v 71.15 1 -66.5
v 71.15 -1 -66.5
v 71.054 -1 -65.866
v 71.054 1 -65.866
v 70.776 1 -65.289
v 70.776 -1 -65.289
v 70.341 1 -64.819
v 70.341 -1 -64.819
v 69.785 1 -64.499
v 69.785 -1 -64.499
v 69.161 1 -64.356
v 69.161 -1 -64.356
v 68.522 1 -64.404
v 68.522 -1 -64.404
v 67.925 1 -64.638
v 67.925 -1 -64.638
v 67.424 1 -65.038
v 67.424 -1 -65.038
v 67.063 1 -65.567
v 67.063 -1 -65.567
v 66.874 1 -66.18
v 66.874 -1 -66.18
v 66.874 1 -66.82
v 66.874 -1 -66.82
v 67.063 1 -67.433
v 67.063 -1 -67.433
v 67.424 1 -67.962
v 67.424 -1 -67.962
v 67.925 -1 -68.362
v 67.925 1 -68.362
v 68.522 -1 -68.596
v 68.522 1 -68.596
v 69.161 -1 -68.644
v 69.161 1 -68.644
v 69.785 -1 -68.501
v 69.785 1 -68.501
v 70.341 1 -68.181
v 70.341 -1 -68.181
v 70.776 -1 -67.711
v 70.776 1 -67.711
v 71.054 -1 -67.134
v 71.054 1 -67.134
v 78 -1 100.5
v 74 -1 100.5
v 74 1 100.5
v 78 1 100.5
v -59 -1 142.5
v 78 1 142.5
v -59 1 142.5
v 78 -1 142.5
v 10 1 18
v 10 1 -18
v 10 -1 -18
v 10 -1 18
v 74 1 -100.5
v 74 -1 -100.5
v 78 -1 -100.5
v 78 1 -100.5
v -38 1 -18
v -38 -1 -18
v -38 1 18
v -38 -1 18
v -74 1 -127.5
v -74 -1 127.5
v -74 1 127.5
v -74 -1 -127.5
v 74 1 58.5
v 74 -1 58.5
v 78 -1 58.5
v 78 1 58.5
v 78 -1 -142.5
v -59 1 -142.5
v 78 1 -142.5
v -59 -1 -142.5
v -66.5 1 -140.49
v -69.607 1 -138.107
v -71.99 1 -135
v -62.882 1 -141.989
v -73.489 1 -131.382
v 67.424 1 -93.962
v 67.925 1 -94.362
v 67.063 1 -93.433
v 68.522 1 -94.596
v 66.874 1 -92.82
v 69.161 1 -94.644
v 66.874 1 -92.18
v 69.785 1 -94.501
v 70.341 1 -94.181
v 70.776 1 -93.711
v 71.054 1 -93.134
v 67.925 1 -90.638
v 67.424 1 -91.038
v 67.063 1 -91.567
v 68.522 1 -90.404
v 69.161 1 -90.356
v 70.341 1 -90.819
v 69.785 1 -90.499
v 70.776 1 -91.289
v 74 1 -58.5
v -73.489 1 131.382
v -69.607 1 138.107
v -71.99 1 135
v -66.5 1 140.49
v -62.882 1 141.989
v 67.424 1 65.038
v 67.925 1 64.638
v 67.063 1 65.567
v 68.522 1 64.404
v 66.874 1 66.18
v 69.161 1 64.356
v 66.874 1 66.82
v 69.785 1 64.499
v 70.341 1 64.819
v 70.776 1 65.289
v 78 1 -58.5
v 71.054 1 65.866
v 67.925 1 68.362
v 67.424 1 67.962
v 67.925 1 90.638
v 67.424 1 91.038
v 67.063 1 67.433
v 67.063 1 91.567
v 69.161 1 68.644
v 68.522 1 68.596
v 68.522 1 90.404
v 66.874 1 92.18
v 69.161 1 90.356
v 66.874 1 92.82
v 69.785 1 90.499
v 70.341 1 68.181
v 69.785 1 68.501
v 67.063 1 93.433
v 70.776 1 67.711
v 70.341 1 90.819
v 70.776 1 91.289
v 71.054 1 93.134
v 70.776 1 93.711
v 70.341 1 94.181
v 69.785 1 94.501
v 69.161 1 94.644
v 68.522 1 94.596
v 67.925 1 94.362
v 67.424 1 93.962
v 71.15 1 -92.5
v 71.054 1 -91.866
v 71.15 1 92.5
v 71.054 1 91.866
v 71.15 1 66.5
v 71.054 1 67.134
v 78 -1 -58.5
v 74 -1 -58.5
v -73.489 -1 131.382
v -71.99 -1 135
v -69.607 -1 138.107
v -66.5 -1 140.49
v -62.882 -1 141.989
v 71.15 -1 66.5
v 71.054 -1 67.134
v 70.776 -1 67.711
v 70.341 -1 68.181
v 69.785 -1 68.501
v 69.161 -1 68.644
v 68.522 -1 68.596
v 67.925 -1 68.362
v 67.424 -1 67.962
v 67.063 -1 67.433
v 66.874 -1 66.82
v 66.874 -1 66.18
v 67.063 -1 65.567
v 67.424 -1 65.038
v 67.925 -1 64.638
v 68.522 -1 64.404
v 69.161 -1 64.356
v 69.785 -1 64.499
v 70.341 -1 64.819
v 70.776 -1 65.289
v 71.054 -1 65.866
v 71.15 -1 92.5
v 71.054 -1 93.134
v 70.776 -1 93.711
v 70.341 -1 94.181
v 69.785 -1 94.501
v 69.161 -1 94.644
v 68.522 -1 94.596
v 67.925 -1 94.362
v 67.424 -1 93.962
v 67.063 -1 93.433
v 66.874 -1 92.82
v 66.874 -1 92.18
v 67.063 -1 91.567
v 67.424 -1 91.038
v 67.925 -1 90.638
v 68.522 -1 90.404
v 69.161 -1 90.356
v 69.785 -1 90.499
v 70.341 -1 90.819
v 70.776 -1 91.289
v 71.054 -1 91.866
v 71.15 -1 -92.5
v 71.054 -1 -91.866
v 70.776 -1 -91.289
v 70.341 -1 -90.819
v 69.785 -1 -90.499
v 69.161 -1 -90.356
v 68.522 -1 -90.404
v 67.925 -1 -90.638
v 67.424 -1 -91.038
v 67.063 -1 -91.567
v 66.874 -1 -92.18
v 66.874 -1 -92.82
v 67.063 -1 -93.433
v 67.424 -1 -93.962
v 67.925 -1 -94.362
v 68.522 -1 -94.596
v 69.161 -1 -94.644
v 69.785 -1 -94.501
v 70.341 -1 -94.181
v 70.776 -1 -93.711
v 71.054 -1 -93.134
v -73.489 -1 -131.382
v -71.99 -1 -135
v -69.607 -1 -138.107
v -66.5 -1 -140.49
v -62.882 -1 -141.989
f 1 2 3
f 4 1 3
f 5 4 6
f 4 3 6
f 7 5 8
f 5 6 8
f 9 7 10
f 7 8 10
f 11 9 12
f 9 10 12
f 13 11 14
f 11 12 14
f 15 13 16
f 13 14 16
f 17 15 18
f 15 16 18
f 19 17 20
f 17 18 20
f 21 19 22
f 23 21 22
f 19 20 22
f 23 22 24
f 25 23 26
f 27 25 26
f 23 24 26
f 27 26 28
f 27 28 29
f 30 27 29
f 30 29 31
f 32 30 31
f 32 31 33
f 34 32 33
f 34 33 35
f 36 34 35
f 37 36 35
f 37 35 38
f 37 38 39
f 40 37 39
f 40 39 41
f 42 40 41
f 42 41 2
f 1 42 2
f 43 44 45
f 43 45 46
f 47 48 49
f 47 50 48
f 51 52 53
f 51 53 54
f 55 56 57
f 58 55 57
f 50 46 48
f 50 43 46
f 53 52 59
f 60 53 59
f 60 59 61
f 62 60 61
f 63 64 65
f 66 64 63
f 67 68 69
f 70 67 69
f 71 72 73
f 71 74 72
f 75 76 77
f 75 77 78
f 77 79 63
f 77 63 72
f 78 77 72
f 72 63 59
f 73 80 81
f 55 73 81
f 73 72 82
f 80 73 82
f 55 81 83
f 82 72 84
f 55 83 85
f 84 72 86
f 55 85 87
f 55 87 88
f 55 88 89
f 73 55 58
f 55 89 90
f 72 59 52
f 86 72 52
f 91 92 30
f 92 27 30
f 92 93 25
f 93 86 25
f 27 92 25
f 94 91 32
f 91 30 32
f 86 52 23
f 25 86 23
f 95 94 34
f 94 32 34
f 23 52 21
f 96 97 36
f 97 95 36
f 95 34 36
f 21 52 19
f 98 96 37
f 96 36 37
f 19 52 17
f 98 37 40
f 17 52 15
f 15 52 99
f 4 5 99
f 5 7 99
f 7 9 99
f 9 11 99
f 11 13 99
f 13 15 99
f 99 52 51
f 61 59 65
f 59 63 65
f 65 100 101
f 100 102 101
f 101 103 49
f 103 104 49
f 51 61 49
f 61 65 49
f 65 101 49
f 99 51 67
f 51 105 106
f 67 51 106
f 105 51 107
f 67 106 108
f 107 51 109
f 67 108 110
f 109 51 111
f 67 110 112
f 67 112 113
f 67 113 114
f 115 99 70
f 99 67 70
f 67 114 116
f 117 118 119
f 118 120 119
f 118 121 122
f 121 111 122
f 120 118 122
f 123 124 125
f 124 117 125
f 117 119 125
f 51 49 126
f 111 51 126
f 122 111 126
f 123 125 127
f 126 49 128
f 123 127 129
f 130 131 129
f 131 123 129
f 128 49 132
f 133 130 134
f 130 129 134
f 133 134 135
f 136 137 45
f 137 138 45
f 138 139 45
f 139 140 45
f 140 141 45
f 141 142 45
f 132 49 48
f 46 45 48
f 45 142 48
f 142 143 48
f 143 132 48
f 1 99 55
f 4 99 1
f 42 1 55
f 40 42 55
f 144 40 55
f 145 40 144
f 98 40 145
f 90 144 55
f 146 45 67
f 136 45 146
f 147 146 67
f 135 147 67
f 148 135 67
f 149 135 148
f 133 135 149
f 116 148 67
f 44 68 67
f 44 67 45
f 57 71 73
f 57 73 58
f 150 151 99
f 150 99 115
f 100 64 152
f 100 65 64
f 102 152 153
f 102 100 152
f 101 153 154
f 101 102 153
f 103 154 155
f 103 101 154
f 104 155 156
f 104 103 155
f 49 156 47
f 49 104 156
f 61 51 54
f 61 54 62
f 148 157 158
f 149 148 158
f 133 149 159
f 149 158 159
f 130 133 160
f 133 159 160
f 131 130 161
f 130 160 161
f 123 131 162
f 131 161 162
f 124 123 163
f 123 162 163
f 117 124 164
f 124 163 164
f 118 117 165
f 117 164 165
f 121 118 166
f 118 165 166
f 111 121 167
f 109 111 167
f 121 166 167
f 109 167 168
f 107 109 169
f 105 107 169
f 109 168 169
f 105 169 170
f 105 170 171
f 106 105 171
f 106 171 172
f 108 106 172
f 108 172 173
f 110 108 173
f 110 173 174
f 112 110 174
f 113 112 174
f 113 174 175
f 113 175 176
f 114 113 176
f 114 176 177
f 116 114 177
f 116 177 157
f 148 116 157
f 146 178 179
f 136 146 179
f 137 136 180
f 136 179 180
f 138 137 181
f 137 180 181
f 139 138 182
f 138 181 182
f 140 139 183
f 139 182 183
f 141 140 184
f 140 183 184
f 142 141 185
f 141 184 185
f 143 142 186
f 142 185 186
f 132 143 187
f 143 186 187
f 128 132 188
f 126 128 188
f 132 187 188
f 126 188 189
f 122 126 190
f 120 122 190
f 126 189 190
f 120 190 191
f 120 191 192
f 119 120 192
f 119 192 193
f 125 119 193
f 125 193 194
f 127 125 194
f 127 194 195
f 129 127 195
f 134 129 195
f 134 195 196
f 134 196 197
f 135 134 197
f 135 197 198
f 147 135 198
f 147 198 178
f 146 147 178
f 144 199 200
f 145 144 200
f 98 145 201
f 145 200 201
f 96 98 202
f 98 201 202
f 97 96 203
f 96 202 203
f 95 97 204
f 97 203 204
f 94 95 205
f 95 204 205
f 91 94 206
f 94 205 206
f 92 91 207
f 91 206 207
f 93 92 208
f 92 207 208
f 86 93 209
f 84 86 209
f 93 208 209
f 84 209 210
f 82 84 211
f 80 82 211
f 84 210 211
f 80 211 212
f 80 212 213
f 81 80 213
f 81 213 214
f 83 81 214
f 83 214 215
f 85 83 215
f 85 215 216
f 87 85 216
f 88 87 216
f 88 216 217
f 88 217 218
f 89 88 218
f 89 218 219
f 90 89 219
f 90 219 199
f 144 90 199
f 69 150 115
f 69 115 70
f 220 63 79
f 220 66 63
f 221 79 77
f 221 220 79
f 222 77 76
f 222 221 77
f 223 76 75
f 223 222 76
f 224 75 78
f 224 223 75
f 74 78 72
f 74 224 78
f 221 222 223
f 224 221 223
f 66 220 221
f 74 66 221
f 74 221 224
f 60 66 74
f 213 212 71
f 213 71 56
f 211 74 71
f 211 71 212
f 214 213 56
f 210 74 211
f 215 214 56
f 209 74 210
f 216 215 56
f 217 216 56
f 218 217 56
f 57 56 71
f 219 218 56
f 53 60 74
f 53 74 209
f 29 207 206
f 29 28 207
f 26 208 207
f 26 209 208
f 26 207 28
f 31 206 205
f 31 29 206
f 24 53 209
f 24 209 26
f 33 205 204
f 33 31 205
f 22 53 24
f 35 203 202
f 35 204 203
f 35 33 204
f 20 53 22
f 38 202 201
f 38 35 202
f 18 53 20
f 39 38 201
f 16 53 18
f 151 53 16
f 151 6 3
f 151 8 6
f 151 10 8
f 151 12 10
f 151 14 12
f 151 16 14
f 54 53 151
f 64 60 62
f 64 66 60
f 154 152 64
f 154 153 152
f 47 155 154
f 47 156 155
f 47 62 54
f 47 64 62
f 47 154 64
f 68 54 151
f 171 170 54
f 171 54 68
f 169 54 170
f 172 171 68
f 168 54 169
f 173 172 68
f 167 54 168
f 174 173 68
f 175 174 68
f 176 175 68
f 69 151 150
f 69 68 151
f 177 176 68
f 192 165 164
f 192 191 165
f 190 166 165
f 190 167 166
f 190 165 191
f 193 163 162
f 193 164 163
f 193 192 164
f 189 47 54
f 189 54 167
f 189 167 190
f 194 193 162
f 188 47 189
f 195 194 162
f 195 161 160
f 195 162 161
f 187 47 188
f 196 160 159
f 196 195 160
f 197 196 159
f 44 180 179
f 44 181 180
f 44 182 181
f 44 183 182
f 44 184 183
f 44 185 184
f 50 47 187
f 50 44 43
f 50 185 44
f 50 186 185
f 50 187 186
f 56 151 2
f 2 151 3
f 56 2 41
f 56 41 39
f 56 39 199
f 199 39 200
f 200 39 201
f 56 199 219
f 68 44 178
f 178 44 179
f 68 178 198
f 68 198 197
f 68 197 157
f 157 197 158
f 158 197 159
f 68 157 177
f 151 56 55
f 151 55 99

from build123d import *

# Parameters (mm, degrees)
F0_W     = 4
F0_H     = 42
F0_H_2   = 117
F1_DEPTH = 1
F2_R     = 15
F4_D     = 4.3
F4_DEPTH = 4
F4_TIP   = 1.2918503309
F5_W     = 48
F5_H     = 36
F6_DEPTH = 2


with BuildPart() as f1:
    # F0 (on Front) → F1 (new body, symmetric)
    with BuildSketch(Plane.XZ):
        Polygon((74, 100.5), (74, 142.5), (-74, 142.5), (-74, -142.5), (74, -142.5), (74, -100.5), (74, -58.5), (74, 58.5), align=None)
        with Locations((76, 121.5)):
            Rectangle(F0_W, F0_H)
        with Locations((76, 0)):
            Rectangle(F0_W, F0_H_2)
        with Locations((76, -121.5)):
            Rectangle(F0_W, F0_H)
    extrude(amount=F1_DEPTH, both=True)

    # F2
    f2_edges = [f1.edges().sort_by_distance(p)[0] for p in [
        (-74, 0, 142.5),
        (-74, 0, -142.5),
    ]]
    fillet(f2_edges, radius=F2_R)

    # F4
    with Locations(Plane(origin=(0, 1, 0), x_dir=(-1, 0, 0), z_dir=(0, 1, 0))):
        with Locations((-69, 92.5), (-69, 66.5), (-69, -92.5), (-69, -66.5)):
            Hole(F4_D / 2, depth=F4_DEPTH)
            with Locations((0, 0, -(F4_DEPTH + F4_TIP / 2))):  # 118° drill point
                Cone(0, F4_D / 2, F4_TIP, mode=Mode.SUBTRACT)

    # F5 (on face) → F6 (cut)
    with BuildSketch(Plane(origin=(0, 1, 0), x_dir=(-1, 0, 0), z_dir=(0, 1, 0))):
        with Locations((14, 0)):
            Rectangle(F5_W, F5_H)
    extrude(amount=-F6_DEPTH, mode=Mode.SUBTRACT)


solid = f1.part
